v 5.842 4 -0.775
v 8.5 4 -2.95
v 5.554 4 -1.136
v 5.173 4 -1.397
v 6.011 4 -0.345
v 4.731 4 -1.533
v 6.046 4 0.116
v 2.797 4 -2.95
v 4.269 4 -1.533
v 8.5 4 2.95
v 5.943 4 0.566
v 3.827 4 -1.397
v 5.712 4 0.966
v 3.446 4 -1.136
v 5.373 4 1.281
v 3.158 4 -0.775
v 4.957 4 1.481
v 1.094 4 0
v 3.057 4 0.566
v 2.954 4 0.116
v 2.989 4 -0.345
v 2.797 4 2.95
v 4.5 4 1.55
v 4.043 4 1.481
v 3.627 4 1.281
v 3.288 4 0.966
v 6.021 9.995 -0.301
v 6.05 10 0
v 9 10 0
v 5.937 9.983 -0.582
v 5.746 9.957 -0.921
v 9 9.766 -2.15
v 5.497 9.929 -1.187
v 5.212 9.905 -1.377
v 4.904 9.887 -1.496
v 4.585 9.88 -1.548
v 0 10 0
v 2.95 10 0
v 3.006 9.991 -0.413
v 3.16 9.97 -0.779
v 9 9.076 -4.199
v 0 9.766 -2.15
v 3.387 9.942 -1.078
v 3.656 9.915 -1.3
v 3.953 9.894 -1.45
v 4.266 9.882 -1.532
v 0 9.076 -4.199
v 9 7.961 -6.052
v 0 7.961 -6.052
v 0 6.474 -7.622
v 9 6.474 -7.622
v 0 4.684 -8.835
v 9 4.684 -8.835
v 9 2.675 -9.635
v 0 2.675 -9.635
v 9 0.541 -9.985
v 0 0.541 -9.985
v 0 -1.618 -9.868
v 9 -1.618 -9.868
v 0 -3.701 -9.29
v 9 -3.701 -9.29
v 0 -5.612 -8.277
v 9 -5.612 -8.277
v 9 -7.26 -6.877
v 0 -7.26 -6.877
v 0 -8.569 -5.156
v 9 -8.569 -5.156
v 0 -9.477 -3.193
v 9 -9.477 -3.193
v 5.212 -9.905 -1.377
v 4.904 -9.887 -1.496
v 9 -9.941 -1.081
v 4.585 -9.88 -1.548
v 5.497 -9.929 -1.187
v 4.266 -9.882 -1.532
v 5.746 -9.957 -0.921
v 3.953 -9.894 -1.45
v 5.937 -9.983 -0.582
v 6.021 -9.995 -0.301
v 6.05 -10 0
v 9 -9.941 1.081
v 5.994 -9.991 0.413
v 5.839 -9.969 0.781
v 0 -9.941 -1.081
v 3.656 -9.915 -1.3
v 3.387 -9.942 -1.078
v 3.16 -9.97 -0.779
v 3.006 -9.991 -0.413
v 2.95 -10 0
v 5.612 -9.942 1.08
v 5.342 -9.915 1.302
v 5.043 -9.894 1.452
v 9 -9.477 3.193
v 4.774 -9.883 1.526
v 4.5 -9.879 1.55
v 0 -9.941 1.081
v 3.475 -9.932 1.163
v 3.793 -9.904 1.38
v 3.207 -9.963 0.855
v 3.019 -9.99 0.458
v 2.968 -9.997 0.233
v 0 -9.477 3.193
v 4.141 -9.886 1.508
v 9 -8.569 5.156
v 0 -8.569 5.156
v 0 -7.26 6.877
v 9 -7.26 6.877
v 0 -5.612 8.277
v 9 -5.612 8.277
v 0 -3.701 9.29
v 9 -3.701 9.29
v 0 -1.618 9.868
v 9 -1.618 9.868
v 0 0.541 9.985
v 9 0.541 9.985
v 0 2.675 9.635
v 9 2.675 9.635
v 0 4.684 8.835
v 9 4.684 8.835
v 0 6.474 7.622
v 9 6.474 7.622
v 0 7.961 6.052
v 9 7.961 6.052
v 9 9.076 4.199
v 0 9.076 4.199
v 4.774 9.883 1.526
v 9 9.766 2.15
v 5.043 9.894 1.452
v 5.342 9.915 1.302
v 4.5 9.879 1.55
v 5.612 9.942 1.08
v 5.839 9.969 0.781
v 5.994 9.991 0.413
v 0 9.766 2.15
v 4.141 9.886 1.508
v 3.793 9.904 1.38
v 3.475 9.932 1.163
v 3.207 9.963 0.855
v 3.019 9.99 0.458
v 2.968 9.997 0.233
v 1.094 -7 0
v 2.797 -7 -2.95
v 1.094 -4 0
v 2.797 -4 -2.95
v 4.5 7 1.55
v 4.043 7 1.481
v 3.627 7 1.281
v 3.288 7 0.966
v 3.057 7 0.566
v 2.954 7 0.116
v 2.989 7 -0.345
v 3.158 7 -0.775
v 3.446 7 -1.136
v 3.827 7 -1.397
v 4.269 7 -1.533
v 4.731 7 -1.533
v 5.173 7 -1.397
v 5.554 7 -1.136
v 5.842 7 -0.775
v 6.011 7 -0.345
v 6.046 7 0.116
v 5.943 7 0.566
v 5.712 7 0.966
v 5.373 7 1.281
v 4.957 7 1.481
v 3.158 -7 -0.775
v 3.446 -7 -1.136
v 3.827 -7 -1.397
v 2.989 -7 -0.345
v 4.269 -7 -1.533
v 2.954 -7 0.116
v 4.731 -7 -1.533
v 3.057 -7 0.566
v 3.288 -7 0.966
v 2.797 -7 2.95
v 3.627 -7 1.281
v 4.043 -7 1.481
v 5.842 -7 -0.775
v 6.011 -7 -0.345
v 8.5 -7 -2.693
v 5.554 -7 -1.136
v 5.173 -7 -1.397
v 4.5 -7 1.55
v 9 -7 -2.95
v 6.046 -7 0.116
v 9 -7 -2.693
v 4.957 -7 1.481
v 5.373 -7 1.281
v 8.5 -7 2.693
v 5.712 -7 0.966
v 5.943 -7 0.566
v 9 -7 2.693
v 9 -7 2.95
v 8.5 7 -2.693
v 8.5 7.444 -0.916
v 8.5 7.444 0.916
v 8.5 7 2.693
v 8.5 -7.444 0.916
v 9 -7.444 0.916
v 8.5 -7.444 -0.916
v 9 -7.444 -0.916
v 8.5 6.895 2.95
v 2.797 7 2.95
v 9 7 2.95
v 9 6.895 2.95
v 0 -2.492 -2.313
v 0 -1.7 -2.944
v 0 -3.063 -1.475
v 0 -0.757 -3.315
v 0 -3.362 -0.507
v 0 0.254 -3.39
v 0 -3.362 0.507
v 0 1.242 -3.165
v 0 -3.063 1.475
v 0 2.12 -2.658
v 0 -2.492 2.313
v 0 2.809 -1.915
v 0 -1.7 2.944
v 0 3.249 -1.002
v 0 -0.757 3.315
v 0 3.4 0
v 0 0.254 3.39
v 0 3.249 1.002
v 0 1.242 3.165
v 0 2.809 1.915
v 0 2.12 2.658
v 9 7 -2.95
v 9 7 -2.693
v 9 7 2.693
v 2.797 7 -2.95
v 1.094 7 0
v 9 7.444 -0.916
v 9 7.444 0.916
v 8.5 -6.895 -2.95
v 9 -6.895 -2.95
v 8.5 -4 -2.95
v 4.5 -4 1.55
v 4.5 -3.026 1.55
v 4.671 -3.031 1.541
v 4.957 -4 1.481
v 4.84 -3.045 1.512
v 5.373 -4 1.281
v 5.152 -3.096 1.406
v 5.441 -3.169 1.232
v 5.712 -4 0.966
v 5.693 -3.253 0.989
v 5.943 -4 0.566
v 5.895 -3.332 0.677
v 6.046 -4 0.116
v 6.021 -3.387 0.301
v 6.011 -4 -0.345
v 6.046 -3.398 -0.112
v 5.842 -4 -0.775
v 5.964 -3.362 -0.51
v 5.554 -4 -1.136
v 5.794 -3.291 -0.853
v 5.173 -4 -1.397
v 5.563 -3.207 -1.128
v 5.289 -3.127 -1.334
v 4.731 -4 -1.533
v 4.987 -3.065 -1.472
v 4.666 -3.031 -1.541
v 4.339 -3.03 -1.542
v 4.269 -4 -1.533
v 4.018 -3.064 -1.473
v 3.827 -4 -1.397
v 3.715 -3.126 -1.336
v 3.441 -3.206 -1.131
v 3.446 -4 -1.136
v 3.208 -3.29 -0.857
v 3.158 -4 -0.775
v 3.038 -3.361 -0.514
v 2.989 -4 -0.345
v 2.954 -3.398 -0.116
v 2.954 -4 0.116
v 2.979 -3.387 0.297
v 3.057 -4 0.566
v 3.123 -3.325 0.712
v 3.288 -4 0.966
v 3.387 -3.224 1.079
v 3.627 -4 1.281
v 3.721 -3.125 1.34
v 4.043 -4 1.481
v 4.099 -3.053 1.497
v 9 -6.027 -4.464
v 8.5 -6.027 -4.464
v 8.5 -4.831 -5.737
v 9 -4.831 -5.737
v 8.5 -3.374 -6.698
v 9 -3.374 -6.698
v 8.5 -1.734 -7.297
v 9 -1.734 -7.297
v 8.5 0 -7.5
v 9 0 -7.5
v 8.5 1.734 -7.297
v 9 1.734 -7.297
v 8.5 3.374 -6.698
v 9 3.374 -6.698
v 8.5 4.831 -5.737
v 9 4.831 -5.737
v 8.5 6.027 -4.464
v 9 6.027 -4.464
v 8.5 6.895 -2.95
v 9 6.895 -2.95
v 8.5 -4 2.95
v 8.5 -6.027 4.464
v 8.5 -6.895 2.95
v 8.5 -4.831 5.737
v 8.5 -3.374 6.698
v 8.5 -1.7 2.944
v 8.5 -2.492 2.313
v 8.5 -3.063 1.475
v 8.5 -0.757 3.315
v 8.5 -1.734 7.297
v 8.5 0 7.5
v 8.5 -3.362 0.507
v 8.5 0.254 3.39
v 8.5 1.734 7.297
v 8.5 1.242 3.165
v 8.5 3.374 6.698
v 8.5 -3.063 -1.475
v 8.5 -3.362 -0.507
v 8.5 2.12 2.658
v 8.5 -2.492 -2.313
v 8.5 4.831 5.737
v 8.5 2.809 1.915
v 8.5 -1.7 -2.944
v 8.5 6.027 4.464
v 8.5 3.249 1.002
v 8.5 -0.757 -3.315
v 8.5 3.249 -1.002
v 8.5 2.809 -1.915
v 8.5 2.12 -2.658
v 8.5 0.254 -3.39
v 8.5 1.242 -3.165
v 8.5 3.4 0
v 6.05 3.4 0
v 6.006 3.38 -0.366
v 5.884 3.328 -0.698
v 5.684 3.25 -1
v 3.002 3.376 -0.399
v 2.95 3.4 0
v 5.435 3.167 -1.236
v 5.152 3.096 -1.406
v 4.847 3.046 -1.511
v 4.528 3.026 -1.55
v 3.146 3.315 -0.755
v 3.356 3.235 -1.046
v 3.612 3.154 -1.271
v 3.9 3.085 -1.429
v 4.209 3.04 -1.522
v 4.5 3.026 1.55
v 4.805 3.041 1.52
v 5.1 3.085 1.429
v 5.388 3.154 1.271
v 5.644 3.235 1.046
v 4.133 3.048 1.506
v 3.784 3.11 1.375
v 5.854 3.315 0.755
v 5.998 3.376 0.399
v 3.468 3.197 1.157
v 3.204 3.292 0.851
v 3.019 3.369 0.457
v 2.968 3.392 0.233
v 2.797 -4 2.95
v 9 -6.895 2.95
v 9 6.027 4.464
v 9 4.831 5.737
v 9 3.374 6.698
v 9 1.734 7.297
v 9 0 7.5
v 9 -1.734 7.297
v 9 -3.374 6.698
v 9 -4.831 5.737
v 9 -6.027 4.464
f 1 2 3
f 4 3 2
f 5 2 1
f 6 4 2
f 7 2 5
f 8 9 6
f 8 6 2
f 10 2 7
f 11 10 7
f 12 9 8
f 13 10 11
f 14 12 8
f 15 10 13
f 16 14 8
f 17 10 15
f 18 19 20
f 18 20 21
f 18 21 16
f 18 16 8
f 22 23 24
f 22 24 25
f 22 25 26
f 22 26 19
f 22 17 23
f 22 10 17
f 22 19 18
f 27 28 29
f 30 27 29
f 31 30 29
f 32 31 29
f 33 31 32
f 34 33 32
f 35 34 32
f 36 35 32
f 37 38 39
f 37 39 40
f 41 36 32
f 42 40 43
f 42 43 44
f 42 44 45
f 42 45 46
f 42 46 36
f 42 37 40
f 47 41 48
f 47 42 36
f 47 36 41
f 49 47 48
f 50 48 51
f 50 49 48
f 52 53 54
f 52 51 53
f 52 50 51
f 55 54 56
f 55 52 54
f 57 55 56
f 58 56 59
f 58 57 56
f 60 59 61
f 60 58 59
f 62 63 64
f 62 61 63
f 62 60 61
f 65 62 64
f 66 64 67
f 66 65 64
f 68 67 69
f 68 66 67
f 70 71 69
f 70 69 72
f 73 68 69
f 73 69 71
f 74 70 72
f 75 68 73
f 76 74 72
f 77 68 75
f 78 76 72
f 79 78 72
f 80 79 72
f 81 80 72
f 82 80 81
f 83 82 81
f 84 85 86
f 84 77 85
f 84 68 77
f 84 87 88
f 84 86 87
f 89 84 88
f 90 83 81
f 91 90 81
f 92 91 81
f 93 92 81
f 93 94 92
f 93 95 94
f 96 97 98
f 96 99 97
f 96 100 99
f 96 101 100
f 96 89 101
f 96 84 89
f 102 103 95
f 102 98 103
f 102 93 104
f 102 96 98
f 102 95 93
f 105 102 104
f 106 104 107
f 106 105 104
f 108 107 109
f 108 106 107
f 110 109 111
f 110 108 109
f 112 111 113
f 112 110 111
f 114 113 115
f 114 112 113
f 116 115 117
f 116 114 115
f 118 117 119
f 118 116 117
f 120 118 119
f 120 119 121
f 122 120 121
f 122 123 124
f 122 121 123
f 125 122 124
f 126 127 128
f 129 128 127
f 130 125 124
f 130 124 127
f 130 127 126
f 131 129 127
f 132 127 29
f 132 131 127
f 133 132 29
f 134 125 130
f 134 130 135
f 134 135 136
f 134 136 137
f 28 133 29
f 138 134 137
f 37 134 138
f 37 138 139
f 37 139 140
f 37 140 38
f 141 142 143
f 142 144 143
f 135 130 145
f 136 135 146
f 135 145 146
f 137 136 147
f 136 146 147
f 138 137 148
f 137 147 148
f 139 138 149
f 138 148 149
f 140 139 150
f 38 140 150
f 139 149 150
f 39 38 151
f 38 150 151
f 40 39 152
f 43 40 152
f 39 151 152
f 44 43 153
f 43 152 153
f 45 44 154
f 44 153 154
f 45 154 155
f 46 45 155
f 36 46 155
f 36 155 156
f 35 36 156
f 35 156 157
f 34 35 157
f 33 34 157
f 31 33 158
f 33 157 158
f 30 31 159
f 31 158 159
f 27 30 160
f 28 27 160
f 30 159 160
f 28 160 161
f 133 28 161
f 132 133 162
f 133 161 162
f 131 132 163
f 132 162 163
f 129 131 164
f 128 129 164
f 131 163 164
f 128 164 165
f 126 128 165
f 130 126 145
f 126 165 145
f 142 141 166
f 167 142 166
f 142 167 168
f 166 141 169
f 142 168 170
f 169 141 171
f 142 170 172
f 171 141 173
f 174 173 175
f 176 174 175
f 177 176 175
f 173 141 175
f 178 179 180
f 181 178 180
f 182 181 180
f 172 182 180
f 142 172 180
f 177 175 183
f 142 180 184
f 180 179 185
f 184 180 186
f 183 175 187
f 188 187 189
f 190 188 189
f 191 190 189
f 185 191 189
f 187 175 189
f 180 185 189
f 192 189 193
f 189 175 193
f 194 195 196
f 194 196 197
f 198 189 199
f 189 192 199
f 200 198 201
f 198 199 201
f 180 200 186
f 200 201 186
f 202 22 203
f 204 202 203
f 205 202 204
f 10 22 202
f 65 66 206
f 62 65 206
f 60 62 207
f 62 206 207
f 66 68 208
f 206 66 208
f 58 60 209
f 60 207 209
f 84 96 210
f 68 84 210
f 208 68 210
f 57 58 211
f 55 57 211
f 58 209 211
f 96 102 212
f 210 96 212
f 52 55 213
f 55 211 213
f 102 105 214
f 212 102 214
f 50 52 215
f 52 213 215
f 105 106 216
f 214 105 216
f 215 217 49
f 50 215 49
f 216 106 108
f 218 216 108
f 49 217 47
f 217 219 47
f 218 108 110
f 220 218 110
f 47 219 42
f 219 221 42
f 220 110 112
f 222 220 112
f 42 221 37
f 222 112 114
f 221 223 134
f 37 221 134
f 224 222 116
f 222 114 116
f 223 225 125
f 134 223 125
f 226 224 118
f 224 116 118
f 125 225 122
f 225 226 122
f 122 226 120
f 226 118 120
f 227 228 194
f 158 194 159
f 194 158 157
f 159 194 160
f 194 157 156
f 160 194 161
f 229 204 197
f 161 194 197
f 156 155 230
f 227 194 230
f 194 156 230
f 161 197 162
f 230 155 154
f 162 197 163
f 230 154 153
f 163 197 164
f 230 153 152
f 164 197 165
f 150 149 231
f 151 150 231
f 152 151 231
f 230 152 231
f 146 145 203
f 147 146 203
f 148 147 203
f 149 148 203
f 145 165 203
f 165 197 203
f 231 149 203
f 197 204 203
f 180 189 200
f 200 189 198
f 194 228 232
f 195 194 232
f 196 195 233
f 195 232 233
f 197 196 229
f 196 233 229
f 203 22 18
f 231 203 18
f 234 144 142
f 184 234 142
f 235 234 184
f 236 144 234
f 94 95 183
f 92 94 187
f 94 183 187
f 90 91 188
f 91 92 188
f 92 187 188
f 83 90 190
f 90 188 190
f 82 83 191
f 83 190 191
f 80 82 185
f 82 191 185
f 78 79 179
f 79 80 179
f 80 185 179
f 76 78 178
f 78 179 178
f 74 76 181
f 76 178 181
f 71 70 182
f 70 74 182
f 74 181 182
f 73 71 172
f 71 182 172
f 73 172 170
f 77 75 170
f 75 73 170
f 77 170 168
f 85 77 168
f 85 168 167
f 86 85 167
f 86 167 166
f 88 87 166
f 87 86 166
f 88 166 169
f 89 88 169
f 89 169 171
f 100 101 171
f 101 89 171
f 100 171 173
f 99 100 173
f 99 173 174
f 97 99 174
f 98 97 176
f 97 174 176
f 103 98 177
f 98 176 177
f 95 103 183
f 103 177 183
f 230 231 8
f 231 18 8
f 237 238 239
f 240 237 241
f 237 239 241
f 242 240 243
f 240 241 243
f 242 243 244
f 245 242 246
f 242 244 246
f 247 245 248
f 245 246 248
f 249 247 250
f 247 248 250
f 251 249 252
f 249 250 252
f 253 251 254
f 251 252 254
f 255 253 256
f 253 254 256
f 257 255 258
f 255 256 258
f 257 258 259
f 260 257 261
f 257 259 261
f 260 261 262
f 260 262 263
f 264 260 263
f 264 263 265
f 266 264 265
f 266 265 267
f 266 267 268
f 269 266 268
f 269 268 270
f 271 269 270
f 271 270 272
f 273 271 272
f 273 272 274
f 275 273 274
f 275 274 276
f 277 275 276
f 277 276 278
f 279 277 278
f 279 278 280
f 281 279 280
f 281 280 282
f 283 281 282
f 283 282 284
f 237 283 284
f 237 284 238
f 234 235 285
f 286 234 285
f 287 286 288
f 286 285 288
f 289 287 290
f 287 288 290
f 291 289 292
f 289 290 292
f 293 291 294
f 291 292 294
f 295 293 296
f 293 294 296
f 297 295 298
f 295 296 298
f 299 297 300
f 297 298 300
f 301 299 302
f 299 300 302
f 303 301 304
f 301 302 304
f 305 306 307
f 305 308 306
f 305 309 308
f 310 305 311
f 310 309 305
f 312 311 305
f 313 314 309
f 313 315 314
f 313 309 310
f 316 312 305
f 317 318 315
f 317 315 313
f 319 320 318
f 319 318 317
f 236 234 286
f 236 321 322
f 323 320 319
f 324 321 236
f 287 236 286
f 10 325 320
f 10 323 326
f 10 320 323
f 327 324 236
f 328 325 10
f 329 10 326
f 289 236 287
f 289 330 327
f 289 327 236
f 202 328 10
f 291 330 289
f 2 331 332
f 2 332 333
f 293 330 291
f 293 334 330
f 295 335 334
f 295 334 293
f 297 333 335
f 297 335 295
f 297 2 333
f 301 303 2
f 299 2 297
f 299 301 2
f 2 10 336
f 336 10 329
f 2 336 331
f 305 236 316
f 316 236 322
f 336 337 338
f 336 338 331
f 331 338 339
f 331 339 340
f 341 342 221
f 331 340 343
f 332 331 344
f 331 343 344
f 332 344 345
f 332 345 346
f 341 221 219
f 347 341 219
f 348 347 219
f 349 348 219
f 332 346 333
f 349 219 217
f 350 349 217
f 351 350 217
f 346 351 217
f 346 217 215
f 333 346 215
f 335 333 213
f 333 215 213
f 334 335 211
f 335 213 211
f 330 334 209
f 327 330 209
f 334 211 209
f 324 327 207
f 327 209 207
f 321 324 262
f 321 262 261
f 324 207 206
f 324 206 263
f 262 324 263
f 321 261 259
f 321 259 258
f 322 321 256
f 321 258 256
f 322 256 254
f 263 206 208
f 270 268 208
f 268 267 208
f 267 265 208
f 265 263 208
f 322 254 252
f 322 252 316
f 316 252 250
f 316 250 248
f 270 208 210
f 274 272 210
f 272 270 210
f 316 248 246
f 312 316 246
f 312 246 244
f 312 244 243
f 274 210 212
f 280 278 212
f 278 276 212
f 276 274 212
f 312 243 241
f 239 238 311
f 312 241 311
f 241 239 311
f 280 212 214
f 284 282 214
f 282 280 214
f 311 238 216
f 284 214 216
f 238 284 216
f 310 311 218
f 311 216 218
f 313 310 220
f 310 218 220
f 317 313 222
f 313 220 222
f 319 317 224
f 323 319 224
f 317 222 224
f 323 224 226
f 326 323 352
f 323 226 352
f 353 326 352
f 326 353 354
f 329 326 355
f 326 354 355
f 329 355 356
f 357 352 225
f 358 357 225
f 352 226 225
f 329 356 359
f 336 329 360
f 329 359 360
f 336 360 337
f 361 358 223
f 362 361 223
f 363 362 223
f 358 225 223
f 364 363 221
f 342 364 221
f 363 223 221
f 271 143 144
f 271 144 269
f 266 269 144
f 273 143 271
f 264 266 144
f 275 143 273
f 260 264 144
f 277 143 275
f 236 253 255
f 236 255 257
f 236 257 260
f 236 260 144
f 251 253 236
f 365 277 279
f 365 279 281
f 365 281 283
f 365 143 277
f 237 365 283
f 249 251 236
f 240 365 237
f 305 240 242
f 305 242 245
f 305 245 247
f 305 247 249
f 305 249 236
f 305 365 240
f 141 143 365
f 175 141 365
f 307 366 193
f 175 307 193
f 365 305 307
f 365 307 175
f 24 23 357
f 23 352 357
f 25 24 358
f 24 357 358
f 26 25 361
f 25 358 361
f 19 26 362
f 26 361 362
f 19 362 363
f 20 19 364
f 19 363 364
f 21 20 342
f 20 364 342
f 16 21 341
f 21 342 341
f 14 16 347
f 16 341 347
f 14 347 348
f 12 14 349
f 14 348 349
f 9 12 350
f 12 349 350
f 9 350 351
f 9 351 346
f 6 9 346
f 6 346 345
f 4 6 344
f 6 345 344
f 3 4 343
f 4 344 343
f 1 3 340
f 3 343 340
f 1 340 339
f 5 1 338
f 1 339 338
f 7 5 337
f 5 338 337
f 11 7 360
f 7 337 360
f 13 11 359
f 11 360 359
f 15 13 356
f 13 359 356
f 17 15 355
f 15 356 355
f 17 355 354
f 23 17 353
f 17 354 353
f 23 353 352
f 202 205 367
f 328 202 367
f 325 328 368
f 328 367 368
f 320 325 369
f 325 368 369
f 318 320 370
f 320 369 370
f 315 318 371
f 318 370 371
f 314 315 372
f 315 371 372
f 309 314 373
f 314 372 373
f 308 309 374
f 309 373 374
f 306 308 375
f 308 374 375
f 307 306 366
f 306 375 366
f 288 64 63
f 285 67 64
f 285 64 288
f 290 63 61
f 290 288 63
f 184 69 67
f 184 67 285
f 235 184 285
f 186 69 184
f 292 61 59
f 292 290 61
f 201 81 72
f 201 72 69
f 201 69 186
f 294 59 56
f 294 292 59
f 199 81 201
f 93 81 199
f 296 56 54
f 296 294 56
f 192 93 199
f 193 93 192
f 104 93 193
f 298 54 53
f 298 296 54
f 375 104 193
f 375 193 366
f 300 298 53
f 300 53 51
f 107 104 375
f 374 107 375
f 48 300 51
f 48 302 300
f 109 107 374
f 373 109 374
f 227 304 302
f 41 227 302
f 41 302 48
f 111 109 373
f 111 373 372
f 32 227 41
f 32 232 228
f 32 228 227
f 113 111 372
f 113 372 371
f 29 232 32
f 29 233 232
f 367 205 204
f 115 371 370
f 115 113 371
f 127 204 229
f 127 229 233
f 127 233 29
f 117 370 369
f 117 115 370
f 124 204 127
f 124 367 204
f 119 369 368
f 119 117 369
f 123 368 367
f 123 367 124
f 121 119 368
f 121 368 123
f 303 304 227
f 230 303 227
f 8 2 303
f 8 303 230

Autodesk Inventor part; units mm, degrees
ref_plane "YZ Plane" through (0, 0, 0) normal (1, 0, 0) x (0, 1, 0)
ref_plane "XY Plane" through (0, 0, 0) normal (0, 0, 1) x (1, 0, 0)
sketch "Sketch9" plane through (0, 0, 0) normal (1, 0, 0) x (0, 1, 0)
  circle A0 centre (0, 0) radius 10
  circle A1 centre (0, 0) radius 3.4
  dimension "d31" = 20
  dimension "d32" = 6.8
extrude "Extrusion7" add sketch "Sketch9" along normal blind 9
sketch "Sketch10" plane through (9, 0, 0) normal (1, 0, 0) x (0, 0, -1)
  circle A0 centre (0, 0) radius 7.5
  dimension "d35" = 15
extrude "Extrusion8" cut sketch "Sketch10" against normal blind 0.5
ref_plane "Work Plane3" through (0, 5.5, 0) normal (0, 1, 0) x (-1, 0, 0)
sketch "Sketch11" plane through (0, 5.5, 0) normal (0, 1, 0) x (-1, 0, 0)
  line L0 (0, 0) -> (-9, 0) construction
  line L1 (-9, 10) -> (-9, -10) construction
  line L2 (-7.9064, 0) -> (-6.2032, 2.95)
  line L3 (-6.2032, 2.95) -> (-2.7968, 2.95)
  line L4 (-2.7968, 2.95) -> (-1.0936, 0)
  line L5 (-1.0936, 0) -> (-2.7968, -2.95)
  line L6 (-2.7968, -2.95) -> (-6.2032, -2.95)
  line L7 (-6.2032, -2.95) -> (-7.9064, 0)
  line L8 (-6.2032, 2.95) -> (-9, 2.95)
  line L9 (-9, 2.95) -> (-9, -2.95)
  line L10 (-9, -2.95) -> (-6.2032, -2.95)
  point P0 (-4.5, 0)
  dimension "d39" = 5.9
extrude "Extrusion9" cut sketch "Sketch11" along normal mid plane 3
ref_plane "Work Plane4" through (0, 10, 0) normal (0, 1, 0) x (-1, 0, 0)
sketch "Sketch12" plane through (0, 10, 0) normal (0, 1, 0) x (-1, 0, 0)
  line L0 (-2.7968, 2.95) -> (-1.0936, 0) construction
  line L1 (-1.9452, 1.475) -> (-5.8393, -0.7732) construction
  line L2 (-1.0936, 0) -> (-2.7968, -2.95) construction
  line L3 (-1.9452, -1.475) -> (-5.6209, 0.6472) construction
  circle A0 centre (-4.5, 0) radius 2.95 construction
  point P0 (0, 0)
hole "Hole2" at (4.5, 10, 0) direction (0, -1, 0) diameter 3.1 depth 10
mirror "Mirror2" about plane through (0, 0, 0) normal (0, 1, 0) of "Extrusion9", "Hole2"
properties part number "Swivel Joint Axle Lock Grub Screw"
